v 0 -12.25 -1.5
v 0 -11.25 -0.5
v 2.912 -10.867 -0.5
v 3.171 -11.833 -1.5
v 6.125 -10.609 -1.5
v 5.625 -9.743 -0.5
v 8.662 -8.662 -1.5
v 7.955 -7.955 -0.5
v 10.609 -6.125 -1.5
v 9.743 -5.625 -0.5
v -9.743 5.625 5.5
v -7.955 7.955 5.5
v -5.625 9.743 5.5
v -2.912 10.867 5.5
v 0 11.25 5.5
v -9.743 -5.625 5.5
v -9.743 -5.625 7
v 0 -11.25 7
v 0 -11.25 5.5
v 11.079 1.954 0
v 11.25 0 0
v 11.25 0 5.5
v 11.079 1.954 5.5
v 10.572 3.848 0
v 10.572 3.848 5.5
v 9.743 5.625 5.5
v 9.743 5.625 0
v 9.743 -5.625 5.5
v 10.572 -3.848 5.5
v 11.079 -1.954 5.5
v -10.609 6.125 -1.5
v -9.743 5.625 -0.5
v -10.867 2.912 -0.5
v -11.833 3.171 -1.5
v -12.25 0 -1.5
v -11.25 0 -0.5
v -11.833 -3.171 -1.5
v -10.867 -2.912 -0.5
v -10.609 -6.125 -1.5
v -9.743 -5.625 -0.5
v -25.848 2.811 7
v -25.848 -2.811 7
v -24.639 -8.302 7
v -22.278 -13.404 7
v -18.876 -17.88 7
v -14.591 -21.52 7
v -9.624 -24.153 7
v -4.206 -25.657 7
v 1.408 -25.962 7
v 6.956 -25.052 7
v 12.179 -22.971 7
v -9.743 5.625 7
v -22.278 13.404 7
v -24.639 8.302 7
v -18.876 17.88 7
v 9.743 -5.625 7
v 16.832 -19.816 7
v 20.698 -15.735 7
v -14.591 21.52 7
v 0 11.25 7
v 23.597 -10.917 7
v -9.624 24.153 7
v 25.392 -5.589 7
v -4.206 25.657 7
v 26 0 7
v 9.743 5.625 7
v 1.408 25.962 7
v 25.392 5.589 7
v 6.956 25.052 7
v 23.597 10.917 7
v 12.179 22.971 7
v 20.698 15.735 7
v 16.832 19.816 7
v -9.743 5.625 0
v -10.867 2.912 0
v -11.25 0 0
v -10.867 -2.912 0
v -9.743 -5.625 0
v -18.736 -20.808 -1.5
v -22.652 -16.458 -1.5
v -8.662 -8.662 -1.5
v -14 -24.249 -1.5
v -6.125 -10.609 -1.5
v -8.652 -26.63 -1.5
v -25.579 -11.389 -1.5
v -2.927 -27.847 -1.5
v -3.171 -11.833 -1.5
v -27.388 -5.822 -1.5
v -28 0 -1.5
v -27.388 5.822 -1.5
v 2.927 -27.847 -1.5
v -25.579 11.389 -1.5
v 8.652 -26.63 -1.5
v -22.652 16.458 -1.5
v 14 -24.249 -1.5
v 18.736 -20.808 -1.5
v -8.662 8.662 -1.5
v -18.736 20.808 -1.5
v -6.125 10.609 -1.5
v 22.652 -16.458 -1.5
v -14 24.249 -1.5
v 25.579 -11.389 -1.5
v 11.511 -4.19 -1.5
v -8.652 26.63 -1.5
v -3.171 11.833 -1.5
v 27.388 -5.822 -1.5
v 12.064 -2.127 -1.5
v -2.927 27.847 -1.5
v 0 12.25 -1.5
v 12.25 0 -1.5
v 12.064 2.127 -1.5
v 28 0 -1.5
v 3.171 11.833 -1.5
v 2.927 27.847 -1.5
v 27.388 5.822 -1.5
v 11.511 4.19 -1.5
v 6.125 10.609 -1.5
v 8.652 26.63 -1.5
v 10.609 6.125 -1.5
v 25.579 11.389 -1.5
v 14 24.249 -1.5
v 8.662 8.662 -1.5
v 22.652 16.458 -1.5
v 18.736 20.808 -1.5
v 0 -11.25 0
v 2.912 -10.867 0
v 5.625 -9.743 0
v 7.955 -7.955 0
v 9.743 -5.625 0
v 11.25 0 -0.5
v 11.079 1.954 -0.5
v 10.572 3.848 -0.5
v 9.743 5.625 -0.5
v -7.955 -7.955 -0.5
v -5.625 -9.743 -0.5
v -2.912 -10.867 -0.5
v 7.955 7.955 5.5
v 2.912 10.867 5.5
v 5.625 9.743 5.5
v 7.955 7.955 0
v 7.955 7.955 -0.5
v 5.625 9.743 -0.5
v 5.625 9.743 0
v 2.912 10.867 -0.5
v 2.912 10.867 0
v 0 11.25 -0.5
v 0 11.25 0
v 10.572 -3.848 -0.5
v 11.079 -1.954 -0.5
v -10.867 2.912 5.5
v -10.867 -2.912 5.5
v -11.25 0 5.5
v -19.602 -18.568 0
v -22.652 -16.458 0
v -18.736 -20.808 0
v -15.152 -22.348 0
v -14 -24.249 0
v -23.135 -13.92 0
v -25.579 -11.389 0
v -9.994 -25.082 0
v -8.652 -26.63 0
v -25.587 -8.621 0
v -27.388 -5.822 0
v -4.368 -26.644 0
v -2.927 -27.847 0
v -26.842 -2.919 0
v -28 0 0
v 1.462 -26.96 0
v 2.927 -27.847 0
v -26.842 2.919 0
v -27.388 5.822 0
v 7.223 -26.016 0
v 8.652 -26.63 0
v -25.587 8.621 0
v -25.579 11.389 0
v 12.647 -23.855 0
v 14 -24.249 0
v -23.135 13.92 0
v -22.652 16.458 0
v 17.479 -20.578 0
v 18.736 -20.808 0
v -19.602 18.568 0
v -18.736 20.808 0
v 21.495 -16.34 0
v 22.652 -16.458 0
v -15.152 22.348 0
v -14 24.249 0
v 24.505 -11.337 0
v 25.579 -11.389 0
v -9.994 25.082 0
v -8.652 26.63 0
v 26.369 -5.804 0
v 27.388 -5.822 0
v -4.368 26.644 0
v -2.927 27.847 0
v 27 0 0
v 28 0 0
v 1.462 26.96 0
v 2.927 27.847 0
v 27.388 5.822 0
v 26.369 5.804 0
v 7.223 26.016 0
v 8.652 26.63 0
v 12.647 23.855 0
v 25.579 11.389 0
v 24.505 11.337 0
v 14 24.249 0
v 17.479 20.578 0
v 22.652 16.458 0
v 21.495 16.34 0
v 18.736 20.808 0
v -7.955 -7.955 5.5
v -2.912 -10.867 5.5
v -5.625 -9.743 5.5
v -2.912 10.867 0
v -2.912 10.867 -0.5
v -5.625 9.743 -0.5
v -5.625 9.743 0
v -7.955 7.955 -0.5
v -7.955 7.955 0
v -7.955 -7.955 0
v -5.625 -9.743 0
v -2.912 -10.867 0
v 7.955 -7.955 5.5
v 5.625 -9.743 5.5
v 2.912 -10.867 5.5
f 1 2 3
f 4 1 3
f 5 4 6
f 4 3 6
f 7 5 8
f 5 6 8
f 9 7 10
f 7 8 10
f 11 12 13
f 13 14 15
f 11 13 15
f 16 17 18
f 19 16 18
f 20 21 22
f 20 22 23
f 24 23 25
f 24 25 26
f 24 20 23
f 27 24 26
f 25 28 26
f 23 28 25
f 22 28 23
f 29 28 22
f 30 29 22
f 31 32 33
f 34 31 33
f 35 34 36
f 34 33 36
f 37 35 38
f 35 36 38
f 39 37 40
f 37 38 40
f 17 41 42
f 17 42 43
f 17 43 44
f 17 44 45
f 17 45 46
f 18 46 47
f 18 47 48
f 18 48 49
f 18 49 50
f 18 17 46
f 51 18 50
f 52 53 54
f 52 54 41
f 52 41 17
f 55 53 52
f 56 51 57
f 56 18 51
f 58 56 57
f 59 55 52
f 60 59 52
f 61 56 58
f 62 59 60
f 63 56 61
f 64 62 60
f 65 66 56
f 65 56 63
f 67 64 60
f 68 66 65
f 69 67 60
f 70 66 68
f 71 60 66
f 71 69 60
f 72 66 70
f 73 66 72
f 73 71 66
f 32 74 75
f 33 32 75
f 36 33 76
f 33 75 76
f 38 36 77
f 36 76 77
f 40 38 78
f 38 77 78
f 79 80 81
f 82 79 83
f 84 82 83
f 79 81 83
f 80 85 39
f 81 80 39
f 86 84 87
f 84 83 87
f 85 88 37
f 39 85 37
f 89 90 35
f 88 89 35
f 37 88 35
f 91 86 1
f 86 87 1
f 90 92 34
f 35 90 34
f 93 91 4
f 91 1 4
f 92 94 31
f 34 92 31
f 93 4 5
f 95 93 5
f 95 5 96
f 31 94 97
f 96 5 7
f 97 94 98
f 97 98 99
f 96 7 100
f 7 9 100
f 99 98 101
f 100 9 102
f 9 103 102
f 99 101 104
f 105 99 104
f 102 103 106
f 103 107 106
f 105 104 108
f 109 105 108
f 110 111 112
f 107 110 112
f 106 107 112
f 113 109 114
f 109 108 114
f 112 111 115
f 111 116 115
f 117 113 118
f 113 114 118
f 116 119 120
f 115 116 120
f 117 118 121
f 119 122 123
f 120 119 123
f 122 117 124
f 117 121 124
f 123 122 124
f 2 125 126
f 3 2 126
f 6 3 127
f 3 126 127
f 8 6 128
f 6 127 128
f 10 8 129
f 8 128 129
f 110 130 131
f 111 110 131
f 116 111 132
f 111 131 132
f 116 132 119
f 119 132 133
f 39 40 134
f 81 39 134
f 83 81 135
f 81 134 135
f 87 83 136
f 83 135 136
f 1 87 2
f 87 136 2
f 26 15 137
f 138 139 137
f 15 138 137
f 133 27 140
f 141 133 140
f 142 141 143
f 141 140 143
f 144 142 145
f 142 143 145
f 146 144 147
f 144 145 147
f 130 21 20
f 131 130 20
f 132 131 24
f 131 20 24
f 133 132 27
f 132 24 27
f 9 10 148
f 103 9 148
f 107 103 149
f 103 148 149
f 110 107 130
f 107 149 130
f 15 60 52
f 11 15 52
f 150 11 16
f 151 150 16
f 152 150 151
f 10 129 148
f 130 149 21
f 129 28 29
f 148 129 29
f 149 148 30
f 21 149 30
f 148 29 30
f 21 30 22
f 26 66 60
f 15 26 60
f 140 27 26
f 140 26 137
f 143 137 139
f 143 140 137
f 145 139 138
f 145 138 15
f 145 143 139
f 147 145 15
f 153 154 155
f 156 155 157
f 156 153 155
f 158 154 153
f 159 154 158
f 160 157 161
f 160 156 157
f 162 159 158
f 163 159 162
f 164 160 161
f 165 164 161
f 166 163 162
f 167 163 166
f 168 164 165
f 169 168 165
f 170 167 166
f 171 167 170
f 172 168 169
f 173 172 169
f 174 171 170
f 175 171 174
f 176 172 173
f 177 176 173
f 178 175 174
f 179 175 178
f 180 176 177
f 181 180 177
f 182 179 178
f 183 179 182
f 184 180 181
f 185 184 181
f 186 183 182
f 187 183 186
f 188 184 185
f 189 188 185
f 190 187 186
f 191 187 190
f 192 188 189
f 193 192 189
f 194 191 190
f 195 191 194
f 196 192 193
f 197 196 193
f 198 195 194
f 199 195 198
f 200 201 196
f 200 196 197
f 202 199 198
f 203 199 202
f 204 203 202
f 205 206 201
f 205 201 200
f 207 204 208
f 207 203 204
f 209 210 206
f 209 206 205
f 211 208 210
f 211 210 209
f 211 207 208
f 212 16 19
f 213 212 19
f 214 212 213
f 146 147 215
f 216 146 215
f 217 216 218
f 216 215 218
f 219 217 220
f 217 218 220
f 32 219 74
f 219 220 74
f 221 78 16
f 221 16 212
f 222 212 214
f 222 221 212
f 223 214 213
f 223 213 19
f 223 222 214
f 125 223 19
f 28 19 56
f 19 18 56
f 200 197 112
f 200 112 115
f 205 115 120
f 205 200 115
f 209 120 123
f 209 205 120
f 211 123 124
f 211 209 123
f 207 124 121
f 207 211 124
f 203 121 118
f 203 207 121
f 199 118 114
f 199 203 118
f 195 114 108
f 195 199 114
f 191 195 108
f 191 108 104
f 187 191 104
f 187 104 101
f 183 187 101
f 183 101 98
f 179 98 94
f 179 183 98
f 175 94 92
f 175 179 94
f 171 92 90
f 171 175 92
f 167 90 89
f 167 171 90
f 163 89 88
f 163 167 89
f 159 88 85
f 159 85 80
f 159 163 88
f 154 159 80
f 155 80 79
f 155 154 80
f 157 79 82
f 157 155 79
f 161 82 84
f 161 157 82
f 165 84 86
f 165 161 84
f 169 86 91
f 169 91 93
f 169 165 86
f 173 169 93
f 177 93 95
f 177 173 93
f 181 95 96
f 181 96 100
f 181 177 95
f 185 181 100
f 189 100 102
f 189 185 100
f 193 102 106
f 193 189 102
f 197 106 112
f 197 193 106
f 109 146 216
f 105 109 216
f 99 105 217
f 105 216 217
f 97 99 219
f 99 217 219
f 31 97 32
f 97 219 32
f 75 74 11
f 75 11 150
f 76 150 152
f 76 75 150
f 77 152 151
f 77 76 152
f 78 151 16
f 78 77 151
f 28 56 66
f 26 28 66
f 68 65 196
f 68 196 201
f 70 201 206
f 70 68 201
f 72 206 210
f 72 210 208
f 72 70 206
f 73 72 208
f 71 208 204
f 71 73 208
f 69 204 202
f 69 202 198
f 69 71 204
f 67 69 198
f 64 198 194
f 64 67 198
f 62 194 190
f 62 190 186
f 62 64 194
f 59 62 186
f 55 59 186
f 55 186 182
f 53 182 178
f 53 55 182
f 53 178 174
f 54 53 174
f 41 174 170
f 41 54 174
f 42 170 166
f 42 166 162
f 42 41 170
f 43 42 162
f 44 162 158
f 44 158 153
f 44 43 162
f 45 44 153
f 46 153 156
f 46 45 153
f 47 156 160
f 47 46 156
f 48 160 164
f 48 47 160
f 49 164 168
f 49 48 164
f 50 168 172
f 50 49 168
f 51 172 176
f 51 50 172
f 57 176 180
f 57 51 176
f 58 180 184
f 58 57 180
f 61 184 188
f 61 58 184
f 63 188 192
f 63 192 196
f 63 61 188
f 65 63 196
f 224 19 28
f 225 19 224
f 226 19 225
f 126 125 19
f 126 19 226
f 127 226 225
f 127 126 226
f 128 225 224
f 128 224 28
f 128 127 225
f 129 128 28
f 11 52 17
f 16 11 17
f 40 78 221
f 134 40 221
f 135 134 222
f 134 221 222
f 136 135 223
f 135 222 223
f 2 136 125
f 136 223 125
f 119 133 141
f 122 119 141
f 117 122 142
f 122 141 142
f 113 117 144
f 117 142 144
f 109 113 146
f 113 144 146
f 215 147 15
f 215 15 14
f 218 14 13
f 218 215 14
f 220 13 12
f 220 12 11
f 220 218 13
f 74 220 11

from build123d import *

# Parameters (mm, degrees)
F5_R          = 27
F6_DEPTH      = 7
F5_R_2        = 28
F7_DEPTH      = 1.5
F8_DEPTH      = 7.001
F8_DEPTH_BACK = 1.501
F9_DEPTH      = 5.5
F9_DEPTH_BACK = 1.501
F10_SIZE2     = 0.99999
F10_SIZE      = 6.99999
F11_SIZE      = 1


# Not quite as in the source:
# - a fillet or chamfer is up to 0.001 mm smaller than in the source, because OpenCascade refuses the exact size


with BuildPart() as f6:
    # F5 (on Top) → F6 (new body)
    with BuildSketch(Plane.XY):
        Circle(F5_R)
        with BuildLine():
            ThreePointArc((9.7427857926, 5.625), (10.8666655458, 2.9117142574), (11.25, 0))
            ThreePointArc((11.25, 0), (10.8666655458, -2.9117142574), (9.7427857926, -5.625))
            ThreePointArc((9.7427857926, -5.625), (5.625, -9.7427857926), (0, -11.25))
            ThreePointArc((0, -11.25), (-5.625, -9.7427857926), (-9.7427857926, -5.625))
            ThreePointArc((-9.7427857926, -5.625), (-11.25, 0), (-9.7427857926, 5.625))
            ThreePointArc((-9.7427857926, 5.625), (-5.625, 9.7427857926), (0, 11.25))
            ThreePointArc((0, 11.25), (5.625, 9.7427857926), (9.7427857926, 5.625))
        make_face(mode=Mode.SUBTRACT)
        with BuildLine():
            Line((-9.7427857926, -5.625), (-9.7427857926, 5.625))
            ThreePointArc((-9.7427857926, 5.625), (-11.25, 0), (-9.7427857926, -5.625))
        make_face()
        with BuildLine():
            Line((0, 11.25), (9.7427857926, 5.625))
            ThreePointArc((9.7427857926, 5.625), (5.625, 9.7427857926), (0, 11.25))
        make_face()
        with BuildLine():
            ThreePointArc((9.7427857926, -5.625), (10.8666655458, -2.9117142574), (11.25, 0))
            ThreePointArc((11.25, 0), (10.8666655458, 2.9117142574), (9.7427857926, 5.625))
            Line((9.7427857926, 5.625), (9.7427857926, -5.625))
        make_face()
        with BuildLine():
            ThreePointArc((0, -11.25), (5.625, -9.7427857926), (9.7427857926, -5.625))
            Line((9.7427857926, -5.625), (0, -11.25))
        make_face()
        with BuildLine():
            ThreePointArc((-9.7427857926, -5.625), (-5.625, -9.7427857926), (0, -11.25))
            Line((0, -11.25), (-9.7427857926, -5.625))
        make_face()
        with BuildLine():
            Line((-9.7427857926, 5.625), (0, 11.25))
            ThreePointArc((0, 11.25), (-5.625, 9.7427857926), (-9.7427857926, 5.625))
        make_face()
        Polygon((9.7427857926, -5.625), (9.7427857926, 5.625), (0, 11.25), (-9.7427857926, 5.625), (-9.7427857926, -5.625), (0, -11.25), align=None)
    extrude(amount=F6_DEPTH)

    # F5 (on Top) → F7 (join)
    with BuildSketch(Plane.XY):
        Circle(F5_R_2)
        Circle(F5_R, mode=Mode.SUBTRACT)
        Circle(F5_R)
        with BuildLine():
            ThreePointArc((9.7427857926, 5.625), (10.8666655458, 2.9117142574), (11.25, 0))
            ThreePointArc((11.25, 0), (10.8666655458, -2.9117142574), (9.7427857926, -5.625))
            ThreePointArc((9.7427857926, -5.625), (5.625, -9.7427857926), (0, -11.25))
            ThreePointArc((0, -11.25), (-5.625, -9.7427857926), (-9.7427857926, -5.625))
            ThreePointArc((-9.7427857926, -5.625), (-11.25, 0), (-9.7427857926, 5.625))
            ThreePointArc((-9.7427857926, 5.625), (-5.625, 9.7427857926), (0, 11.25))
            ThreePointArc((0, 11.25), (5.625, 9.7427857926), (9.7427857926, 5.625))
        make_face(mode=Mode.SUBTRACT)
        Polygon((9.7427857926, -5.625), (9.7427857926, 5.625), (0, 11.25), (-9.7427857926, 5.625), (-9.7427857926, -5.625), (0, -11.25), align=None)
        with BuildLine():
            ThreePointArc((9.7427857926, -5.625), (10.8666655458, -2.9117142574), (11.25, 0))
            ThreePointArc((11.25, 0), (10.8666655458, 2.9117142574), (9.7427857926, 5.625))
            Line((9.7427857926, 5.625), (9.7427857926, -5.625))
        make_face()
        with BuildLine():
            ThreePointArc((0, -11.25), (5.625, -9.7427857926), (9.7427857926, -5.625))
            Line((9.7427857926, -5.625), (0, -11.25))
        make_face()
        with BuildLine():
            ThreePointArc((-9.7427857926, -5.625), (-5.625, -9.7427857926), (0, -11.25))
            Line((0, -11.25), (-9.7427857926, -5.625))
        make_face()
        with BuildLine():
            Line((-9.7427857926, -5.625), (-9.7427857926, 5.625))
            ThreePointArc((-9.7427857926, 5.625), (-11.25, 0), (-9.7427857926, -5.625))
        make_face()
        with BuildLine():
            Line((0, 11.25), (9.7427857926, 5.625))
            ThreePointArc((9.7427857926, 5.625), (5.625, 9.7427857926), (0, 11.25))
        make_face()
        with BuildLine():
            Line((-9.7427857926, 5.625), (0, 11.25))
            ThreePointArc((0, 11.25), (-5.625, 9.7427857926), (-9.7427857926, 5.625))
        make_face()
    extrude(amount=-F7_DEPTH)

    # F5 (on Top) → F8 (cut, two sides)
    with BuildSketch(Plane.XY) as f8_sk:
        Polygon((9.7427857926, -5.625), (9.7427857926, 5.625), (0, 11.25), (-9.7427857926, 5.625), (-9.7427857926, -5.625), (0, -11.25), align=None)
    extrude(amount=F8_DEPTH, mode=Mode.SUBTRACT)
    extrude(f8_sk.sketch, amount=-F8_DEPTH_BACK, mode=Mode.SUBTRACT)

    # F5 (on Top) → F9 (cut, two sides)
    with BuildSketch(Plane.XY) as f9_sk:
        with BuildLine():
            ThreePointArc((-9.7427857926, -5.625), (-5.625, -9.7427857926), (0, -11.25))
            Line((0, -11.25), (-9.7427857926, -5.625))
        make_face()
        with BuildLine():
            ThreePointArc((0, -11.25), (5.625, -9.7427857926), (9.7427857926, -5.625))
            Line((9.7427857926, -5.625), (0, -11.25))
        make_face()
        with BuildLine():
            ThreePointArc((9.7427857926, -5.625), (10.8666655458, -2.9117142574), (11.25, 0))
            ThreePointArc((11.25, 0), (10.8666655458, 2.9117142574), (9.7427857926, 5.625))
            Line((9.7427857926, 5.625), (9.7427857926, -5.625))
        make_face()
        with BuildLine():
            Line((0, 11.25), (9.7427857926, 5.625))
            ThreePointArc((9.7427857926, 5.625), (5.625, 9.7427857926), (0, 11.25))
        make_face()
        with BuildLine():
            Line((-9.7427857926, 5.625), (0, 11.25))
            ThreePointArc((0, 11.25), (-5.625, 9.7427857926), (-9.7427857926, 5.625))
        make_face()
        with BuildLine():
            Line((-9.7427857926, -5.625), (-9.7427857926, 5.625))
            ThreePointArc((-9.7427857926, 5.625), (-11.25, 0), (-9.7427857926, -5.625))
        make_face()
    extrude(amount=F9_DEPTH, mode=Mode.SUBTRACT)
    extrude(f9_sk.sketch, amount=-F9_DEPTH_BACK, mode=Mode.SUBTRACT)

    # F10 (size 7 and 1 in the source; OpenCascade refuses exactly that, so slightly less here)
    f10_edges = [f6.edges().sort_by_distance(p)[0] for p in [
        (-27, 0, 7),
    ]]
    f10_side = f6.faces().sort_by_distance((-27, 0, 3.5))[0]
    chamfer(f10_edges, length=F10_SIZE, length2=F10_SIZE2, reference=f10_side)

    # F11
    f11_edges = [f6.edges().sort_by_distance(p)[0] for p in [
        (0, 11.25, -1.5),
    ]]
    chamfer(f11_edges, length=F11_SIZE)


solid = f6.part
